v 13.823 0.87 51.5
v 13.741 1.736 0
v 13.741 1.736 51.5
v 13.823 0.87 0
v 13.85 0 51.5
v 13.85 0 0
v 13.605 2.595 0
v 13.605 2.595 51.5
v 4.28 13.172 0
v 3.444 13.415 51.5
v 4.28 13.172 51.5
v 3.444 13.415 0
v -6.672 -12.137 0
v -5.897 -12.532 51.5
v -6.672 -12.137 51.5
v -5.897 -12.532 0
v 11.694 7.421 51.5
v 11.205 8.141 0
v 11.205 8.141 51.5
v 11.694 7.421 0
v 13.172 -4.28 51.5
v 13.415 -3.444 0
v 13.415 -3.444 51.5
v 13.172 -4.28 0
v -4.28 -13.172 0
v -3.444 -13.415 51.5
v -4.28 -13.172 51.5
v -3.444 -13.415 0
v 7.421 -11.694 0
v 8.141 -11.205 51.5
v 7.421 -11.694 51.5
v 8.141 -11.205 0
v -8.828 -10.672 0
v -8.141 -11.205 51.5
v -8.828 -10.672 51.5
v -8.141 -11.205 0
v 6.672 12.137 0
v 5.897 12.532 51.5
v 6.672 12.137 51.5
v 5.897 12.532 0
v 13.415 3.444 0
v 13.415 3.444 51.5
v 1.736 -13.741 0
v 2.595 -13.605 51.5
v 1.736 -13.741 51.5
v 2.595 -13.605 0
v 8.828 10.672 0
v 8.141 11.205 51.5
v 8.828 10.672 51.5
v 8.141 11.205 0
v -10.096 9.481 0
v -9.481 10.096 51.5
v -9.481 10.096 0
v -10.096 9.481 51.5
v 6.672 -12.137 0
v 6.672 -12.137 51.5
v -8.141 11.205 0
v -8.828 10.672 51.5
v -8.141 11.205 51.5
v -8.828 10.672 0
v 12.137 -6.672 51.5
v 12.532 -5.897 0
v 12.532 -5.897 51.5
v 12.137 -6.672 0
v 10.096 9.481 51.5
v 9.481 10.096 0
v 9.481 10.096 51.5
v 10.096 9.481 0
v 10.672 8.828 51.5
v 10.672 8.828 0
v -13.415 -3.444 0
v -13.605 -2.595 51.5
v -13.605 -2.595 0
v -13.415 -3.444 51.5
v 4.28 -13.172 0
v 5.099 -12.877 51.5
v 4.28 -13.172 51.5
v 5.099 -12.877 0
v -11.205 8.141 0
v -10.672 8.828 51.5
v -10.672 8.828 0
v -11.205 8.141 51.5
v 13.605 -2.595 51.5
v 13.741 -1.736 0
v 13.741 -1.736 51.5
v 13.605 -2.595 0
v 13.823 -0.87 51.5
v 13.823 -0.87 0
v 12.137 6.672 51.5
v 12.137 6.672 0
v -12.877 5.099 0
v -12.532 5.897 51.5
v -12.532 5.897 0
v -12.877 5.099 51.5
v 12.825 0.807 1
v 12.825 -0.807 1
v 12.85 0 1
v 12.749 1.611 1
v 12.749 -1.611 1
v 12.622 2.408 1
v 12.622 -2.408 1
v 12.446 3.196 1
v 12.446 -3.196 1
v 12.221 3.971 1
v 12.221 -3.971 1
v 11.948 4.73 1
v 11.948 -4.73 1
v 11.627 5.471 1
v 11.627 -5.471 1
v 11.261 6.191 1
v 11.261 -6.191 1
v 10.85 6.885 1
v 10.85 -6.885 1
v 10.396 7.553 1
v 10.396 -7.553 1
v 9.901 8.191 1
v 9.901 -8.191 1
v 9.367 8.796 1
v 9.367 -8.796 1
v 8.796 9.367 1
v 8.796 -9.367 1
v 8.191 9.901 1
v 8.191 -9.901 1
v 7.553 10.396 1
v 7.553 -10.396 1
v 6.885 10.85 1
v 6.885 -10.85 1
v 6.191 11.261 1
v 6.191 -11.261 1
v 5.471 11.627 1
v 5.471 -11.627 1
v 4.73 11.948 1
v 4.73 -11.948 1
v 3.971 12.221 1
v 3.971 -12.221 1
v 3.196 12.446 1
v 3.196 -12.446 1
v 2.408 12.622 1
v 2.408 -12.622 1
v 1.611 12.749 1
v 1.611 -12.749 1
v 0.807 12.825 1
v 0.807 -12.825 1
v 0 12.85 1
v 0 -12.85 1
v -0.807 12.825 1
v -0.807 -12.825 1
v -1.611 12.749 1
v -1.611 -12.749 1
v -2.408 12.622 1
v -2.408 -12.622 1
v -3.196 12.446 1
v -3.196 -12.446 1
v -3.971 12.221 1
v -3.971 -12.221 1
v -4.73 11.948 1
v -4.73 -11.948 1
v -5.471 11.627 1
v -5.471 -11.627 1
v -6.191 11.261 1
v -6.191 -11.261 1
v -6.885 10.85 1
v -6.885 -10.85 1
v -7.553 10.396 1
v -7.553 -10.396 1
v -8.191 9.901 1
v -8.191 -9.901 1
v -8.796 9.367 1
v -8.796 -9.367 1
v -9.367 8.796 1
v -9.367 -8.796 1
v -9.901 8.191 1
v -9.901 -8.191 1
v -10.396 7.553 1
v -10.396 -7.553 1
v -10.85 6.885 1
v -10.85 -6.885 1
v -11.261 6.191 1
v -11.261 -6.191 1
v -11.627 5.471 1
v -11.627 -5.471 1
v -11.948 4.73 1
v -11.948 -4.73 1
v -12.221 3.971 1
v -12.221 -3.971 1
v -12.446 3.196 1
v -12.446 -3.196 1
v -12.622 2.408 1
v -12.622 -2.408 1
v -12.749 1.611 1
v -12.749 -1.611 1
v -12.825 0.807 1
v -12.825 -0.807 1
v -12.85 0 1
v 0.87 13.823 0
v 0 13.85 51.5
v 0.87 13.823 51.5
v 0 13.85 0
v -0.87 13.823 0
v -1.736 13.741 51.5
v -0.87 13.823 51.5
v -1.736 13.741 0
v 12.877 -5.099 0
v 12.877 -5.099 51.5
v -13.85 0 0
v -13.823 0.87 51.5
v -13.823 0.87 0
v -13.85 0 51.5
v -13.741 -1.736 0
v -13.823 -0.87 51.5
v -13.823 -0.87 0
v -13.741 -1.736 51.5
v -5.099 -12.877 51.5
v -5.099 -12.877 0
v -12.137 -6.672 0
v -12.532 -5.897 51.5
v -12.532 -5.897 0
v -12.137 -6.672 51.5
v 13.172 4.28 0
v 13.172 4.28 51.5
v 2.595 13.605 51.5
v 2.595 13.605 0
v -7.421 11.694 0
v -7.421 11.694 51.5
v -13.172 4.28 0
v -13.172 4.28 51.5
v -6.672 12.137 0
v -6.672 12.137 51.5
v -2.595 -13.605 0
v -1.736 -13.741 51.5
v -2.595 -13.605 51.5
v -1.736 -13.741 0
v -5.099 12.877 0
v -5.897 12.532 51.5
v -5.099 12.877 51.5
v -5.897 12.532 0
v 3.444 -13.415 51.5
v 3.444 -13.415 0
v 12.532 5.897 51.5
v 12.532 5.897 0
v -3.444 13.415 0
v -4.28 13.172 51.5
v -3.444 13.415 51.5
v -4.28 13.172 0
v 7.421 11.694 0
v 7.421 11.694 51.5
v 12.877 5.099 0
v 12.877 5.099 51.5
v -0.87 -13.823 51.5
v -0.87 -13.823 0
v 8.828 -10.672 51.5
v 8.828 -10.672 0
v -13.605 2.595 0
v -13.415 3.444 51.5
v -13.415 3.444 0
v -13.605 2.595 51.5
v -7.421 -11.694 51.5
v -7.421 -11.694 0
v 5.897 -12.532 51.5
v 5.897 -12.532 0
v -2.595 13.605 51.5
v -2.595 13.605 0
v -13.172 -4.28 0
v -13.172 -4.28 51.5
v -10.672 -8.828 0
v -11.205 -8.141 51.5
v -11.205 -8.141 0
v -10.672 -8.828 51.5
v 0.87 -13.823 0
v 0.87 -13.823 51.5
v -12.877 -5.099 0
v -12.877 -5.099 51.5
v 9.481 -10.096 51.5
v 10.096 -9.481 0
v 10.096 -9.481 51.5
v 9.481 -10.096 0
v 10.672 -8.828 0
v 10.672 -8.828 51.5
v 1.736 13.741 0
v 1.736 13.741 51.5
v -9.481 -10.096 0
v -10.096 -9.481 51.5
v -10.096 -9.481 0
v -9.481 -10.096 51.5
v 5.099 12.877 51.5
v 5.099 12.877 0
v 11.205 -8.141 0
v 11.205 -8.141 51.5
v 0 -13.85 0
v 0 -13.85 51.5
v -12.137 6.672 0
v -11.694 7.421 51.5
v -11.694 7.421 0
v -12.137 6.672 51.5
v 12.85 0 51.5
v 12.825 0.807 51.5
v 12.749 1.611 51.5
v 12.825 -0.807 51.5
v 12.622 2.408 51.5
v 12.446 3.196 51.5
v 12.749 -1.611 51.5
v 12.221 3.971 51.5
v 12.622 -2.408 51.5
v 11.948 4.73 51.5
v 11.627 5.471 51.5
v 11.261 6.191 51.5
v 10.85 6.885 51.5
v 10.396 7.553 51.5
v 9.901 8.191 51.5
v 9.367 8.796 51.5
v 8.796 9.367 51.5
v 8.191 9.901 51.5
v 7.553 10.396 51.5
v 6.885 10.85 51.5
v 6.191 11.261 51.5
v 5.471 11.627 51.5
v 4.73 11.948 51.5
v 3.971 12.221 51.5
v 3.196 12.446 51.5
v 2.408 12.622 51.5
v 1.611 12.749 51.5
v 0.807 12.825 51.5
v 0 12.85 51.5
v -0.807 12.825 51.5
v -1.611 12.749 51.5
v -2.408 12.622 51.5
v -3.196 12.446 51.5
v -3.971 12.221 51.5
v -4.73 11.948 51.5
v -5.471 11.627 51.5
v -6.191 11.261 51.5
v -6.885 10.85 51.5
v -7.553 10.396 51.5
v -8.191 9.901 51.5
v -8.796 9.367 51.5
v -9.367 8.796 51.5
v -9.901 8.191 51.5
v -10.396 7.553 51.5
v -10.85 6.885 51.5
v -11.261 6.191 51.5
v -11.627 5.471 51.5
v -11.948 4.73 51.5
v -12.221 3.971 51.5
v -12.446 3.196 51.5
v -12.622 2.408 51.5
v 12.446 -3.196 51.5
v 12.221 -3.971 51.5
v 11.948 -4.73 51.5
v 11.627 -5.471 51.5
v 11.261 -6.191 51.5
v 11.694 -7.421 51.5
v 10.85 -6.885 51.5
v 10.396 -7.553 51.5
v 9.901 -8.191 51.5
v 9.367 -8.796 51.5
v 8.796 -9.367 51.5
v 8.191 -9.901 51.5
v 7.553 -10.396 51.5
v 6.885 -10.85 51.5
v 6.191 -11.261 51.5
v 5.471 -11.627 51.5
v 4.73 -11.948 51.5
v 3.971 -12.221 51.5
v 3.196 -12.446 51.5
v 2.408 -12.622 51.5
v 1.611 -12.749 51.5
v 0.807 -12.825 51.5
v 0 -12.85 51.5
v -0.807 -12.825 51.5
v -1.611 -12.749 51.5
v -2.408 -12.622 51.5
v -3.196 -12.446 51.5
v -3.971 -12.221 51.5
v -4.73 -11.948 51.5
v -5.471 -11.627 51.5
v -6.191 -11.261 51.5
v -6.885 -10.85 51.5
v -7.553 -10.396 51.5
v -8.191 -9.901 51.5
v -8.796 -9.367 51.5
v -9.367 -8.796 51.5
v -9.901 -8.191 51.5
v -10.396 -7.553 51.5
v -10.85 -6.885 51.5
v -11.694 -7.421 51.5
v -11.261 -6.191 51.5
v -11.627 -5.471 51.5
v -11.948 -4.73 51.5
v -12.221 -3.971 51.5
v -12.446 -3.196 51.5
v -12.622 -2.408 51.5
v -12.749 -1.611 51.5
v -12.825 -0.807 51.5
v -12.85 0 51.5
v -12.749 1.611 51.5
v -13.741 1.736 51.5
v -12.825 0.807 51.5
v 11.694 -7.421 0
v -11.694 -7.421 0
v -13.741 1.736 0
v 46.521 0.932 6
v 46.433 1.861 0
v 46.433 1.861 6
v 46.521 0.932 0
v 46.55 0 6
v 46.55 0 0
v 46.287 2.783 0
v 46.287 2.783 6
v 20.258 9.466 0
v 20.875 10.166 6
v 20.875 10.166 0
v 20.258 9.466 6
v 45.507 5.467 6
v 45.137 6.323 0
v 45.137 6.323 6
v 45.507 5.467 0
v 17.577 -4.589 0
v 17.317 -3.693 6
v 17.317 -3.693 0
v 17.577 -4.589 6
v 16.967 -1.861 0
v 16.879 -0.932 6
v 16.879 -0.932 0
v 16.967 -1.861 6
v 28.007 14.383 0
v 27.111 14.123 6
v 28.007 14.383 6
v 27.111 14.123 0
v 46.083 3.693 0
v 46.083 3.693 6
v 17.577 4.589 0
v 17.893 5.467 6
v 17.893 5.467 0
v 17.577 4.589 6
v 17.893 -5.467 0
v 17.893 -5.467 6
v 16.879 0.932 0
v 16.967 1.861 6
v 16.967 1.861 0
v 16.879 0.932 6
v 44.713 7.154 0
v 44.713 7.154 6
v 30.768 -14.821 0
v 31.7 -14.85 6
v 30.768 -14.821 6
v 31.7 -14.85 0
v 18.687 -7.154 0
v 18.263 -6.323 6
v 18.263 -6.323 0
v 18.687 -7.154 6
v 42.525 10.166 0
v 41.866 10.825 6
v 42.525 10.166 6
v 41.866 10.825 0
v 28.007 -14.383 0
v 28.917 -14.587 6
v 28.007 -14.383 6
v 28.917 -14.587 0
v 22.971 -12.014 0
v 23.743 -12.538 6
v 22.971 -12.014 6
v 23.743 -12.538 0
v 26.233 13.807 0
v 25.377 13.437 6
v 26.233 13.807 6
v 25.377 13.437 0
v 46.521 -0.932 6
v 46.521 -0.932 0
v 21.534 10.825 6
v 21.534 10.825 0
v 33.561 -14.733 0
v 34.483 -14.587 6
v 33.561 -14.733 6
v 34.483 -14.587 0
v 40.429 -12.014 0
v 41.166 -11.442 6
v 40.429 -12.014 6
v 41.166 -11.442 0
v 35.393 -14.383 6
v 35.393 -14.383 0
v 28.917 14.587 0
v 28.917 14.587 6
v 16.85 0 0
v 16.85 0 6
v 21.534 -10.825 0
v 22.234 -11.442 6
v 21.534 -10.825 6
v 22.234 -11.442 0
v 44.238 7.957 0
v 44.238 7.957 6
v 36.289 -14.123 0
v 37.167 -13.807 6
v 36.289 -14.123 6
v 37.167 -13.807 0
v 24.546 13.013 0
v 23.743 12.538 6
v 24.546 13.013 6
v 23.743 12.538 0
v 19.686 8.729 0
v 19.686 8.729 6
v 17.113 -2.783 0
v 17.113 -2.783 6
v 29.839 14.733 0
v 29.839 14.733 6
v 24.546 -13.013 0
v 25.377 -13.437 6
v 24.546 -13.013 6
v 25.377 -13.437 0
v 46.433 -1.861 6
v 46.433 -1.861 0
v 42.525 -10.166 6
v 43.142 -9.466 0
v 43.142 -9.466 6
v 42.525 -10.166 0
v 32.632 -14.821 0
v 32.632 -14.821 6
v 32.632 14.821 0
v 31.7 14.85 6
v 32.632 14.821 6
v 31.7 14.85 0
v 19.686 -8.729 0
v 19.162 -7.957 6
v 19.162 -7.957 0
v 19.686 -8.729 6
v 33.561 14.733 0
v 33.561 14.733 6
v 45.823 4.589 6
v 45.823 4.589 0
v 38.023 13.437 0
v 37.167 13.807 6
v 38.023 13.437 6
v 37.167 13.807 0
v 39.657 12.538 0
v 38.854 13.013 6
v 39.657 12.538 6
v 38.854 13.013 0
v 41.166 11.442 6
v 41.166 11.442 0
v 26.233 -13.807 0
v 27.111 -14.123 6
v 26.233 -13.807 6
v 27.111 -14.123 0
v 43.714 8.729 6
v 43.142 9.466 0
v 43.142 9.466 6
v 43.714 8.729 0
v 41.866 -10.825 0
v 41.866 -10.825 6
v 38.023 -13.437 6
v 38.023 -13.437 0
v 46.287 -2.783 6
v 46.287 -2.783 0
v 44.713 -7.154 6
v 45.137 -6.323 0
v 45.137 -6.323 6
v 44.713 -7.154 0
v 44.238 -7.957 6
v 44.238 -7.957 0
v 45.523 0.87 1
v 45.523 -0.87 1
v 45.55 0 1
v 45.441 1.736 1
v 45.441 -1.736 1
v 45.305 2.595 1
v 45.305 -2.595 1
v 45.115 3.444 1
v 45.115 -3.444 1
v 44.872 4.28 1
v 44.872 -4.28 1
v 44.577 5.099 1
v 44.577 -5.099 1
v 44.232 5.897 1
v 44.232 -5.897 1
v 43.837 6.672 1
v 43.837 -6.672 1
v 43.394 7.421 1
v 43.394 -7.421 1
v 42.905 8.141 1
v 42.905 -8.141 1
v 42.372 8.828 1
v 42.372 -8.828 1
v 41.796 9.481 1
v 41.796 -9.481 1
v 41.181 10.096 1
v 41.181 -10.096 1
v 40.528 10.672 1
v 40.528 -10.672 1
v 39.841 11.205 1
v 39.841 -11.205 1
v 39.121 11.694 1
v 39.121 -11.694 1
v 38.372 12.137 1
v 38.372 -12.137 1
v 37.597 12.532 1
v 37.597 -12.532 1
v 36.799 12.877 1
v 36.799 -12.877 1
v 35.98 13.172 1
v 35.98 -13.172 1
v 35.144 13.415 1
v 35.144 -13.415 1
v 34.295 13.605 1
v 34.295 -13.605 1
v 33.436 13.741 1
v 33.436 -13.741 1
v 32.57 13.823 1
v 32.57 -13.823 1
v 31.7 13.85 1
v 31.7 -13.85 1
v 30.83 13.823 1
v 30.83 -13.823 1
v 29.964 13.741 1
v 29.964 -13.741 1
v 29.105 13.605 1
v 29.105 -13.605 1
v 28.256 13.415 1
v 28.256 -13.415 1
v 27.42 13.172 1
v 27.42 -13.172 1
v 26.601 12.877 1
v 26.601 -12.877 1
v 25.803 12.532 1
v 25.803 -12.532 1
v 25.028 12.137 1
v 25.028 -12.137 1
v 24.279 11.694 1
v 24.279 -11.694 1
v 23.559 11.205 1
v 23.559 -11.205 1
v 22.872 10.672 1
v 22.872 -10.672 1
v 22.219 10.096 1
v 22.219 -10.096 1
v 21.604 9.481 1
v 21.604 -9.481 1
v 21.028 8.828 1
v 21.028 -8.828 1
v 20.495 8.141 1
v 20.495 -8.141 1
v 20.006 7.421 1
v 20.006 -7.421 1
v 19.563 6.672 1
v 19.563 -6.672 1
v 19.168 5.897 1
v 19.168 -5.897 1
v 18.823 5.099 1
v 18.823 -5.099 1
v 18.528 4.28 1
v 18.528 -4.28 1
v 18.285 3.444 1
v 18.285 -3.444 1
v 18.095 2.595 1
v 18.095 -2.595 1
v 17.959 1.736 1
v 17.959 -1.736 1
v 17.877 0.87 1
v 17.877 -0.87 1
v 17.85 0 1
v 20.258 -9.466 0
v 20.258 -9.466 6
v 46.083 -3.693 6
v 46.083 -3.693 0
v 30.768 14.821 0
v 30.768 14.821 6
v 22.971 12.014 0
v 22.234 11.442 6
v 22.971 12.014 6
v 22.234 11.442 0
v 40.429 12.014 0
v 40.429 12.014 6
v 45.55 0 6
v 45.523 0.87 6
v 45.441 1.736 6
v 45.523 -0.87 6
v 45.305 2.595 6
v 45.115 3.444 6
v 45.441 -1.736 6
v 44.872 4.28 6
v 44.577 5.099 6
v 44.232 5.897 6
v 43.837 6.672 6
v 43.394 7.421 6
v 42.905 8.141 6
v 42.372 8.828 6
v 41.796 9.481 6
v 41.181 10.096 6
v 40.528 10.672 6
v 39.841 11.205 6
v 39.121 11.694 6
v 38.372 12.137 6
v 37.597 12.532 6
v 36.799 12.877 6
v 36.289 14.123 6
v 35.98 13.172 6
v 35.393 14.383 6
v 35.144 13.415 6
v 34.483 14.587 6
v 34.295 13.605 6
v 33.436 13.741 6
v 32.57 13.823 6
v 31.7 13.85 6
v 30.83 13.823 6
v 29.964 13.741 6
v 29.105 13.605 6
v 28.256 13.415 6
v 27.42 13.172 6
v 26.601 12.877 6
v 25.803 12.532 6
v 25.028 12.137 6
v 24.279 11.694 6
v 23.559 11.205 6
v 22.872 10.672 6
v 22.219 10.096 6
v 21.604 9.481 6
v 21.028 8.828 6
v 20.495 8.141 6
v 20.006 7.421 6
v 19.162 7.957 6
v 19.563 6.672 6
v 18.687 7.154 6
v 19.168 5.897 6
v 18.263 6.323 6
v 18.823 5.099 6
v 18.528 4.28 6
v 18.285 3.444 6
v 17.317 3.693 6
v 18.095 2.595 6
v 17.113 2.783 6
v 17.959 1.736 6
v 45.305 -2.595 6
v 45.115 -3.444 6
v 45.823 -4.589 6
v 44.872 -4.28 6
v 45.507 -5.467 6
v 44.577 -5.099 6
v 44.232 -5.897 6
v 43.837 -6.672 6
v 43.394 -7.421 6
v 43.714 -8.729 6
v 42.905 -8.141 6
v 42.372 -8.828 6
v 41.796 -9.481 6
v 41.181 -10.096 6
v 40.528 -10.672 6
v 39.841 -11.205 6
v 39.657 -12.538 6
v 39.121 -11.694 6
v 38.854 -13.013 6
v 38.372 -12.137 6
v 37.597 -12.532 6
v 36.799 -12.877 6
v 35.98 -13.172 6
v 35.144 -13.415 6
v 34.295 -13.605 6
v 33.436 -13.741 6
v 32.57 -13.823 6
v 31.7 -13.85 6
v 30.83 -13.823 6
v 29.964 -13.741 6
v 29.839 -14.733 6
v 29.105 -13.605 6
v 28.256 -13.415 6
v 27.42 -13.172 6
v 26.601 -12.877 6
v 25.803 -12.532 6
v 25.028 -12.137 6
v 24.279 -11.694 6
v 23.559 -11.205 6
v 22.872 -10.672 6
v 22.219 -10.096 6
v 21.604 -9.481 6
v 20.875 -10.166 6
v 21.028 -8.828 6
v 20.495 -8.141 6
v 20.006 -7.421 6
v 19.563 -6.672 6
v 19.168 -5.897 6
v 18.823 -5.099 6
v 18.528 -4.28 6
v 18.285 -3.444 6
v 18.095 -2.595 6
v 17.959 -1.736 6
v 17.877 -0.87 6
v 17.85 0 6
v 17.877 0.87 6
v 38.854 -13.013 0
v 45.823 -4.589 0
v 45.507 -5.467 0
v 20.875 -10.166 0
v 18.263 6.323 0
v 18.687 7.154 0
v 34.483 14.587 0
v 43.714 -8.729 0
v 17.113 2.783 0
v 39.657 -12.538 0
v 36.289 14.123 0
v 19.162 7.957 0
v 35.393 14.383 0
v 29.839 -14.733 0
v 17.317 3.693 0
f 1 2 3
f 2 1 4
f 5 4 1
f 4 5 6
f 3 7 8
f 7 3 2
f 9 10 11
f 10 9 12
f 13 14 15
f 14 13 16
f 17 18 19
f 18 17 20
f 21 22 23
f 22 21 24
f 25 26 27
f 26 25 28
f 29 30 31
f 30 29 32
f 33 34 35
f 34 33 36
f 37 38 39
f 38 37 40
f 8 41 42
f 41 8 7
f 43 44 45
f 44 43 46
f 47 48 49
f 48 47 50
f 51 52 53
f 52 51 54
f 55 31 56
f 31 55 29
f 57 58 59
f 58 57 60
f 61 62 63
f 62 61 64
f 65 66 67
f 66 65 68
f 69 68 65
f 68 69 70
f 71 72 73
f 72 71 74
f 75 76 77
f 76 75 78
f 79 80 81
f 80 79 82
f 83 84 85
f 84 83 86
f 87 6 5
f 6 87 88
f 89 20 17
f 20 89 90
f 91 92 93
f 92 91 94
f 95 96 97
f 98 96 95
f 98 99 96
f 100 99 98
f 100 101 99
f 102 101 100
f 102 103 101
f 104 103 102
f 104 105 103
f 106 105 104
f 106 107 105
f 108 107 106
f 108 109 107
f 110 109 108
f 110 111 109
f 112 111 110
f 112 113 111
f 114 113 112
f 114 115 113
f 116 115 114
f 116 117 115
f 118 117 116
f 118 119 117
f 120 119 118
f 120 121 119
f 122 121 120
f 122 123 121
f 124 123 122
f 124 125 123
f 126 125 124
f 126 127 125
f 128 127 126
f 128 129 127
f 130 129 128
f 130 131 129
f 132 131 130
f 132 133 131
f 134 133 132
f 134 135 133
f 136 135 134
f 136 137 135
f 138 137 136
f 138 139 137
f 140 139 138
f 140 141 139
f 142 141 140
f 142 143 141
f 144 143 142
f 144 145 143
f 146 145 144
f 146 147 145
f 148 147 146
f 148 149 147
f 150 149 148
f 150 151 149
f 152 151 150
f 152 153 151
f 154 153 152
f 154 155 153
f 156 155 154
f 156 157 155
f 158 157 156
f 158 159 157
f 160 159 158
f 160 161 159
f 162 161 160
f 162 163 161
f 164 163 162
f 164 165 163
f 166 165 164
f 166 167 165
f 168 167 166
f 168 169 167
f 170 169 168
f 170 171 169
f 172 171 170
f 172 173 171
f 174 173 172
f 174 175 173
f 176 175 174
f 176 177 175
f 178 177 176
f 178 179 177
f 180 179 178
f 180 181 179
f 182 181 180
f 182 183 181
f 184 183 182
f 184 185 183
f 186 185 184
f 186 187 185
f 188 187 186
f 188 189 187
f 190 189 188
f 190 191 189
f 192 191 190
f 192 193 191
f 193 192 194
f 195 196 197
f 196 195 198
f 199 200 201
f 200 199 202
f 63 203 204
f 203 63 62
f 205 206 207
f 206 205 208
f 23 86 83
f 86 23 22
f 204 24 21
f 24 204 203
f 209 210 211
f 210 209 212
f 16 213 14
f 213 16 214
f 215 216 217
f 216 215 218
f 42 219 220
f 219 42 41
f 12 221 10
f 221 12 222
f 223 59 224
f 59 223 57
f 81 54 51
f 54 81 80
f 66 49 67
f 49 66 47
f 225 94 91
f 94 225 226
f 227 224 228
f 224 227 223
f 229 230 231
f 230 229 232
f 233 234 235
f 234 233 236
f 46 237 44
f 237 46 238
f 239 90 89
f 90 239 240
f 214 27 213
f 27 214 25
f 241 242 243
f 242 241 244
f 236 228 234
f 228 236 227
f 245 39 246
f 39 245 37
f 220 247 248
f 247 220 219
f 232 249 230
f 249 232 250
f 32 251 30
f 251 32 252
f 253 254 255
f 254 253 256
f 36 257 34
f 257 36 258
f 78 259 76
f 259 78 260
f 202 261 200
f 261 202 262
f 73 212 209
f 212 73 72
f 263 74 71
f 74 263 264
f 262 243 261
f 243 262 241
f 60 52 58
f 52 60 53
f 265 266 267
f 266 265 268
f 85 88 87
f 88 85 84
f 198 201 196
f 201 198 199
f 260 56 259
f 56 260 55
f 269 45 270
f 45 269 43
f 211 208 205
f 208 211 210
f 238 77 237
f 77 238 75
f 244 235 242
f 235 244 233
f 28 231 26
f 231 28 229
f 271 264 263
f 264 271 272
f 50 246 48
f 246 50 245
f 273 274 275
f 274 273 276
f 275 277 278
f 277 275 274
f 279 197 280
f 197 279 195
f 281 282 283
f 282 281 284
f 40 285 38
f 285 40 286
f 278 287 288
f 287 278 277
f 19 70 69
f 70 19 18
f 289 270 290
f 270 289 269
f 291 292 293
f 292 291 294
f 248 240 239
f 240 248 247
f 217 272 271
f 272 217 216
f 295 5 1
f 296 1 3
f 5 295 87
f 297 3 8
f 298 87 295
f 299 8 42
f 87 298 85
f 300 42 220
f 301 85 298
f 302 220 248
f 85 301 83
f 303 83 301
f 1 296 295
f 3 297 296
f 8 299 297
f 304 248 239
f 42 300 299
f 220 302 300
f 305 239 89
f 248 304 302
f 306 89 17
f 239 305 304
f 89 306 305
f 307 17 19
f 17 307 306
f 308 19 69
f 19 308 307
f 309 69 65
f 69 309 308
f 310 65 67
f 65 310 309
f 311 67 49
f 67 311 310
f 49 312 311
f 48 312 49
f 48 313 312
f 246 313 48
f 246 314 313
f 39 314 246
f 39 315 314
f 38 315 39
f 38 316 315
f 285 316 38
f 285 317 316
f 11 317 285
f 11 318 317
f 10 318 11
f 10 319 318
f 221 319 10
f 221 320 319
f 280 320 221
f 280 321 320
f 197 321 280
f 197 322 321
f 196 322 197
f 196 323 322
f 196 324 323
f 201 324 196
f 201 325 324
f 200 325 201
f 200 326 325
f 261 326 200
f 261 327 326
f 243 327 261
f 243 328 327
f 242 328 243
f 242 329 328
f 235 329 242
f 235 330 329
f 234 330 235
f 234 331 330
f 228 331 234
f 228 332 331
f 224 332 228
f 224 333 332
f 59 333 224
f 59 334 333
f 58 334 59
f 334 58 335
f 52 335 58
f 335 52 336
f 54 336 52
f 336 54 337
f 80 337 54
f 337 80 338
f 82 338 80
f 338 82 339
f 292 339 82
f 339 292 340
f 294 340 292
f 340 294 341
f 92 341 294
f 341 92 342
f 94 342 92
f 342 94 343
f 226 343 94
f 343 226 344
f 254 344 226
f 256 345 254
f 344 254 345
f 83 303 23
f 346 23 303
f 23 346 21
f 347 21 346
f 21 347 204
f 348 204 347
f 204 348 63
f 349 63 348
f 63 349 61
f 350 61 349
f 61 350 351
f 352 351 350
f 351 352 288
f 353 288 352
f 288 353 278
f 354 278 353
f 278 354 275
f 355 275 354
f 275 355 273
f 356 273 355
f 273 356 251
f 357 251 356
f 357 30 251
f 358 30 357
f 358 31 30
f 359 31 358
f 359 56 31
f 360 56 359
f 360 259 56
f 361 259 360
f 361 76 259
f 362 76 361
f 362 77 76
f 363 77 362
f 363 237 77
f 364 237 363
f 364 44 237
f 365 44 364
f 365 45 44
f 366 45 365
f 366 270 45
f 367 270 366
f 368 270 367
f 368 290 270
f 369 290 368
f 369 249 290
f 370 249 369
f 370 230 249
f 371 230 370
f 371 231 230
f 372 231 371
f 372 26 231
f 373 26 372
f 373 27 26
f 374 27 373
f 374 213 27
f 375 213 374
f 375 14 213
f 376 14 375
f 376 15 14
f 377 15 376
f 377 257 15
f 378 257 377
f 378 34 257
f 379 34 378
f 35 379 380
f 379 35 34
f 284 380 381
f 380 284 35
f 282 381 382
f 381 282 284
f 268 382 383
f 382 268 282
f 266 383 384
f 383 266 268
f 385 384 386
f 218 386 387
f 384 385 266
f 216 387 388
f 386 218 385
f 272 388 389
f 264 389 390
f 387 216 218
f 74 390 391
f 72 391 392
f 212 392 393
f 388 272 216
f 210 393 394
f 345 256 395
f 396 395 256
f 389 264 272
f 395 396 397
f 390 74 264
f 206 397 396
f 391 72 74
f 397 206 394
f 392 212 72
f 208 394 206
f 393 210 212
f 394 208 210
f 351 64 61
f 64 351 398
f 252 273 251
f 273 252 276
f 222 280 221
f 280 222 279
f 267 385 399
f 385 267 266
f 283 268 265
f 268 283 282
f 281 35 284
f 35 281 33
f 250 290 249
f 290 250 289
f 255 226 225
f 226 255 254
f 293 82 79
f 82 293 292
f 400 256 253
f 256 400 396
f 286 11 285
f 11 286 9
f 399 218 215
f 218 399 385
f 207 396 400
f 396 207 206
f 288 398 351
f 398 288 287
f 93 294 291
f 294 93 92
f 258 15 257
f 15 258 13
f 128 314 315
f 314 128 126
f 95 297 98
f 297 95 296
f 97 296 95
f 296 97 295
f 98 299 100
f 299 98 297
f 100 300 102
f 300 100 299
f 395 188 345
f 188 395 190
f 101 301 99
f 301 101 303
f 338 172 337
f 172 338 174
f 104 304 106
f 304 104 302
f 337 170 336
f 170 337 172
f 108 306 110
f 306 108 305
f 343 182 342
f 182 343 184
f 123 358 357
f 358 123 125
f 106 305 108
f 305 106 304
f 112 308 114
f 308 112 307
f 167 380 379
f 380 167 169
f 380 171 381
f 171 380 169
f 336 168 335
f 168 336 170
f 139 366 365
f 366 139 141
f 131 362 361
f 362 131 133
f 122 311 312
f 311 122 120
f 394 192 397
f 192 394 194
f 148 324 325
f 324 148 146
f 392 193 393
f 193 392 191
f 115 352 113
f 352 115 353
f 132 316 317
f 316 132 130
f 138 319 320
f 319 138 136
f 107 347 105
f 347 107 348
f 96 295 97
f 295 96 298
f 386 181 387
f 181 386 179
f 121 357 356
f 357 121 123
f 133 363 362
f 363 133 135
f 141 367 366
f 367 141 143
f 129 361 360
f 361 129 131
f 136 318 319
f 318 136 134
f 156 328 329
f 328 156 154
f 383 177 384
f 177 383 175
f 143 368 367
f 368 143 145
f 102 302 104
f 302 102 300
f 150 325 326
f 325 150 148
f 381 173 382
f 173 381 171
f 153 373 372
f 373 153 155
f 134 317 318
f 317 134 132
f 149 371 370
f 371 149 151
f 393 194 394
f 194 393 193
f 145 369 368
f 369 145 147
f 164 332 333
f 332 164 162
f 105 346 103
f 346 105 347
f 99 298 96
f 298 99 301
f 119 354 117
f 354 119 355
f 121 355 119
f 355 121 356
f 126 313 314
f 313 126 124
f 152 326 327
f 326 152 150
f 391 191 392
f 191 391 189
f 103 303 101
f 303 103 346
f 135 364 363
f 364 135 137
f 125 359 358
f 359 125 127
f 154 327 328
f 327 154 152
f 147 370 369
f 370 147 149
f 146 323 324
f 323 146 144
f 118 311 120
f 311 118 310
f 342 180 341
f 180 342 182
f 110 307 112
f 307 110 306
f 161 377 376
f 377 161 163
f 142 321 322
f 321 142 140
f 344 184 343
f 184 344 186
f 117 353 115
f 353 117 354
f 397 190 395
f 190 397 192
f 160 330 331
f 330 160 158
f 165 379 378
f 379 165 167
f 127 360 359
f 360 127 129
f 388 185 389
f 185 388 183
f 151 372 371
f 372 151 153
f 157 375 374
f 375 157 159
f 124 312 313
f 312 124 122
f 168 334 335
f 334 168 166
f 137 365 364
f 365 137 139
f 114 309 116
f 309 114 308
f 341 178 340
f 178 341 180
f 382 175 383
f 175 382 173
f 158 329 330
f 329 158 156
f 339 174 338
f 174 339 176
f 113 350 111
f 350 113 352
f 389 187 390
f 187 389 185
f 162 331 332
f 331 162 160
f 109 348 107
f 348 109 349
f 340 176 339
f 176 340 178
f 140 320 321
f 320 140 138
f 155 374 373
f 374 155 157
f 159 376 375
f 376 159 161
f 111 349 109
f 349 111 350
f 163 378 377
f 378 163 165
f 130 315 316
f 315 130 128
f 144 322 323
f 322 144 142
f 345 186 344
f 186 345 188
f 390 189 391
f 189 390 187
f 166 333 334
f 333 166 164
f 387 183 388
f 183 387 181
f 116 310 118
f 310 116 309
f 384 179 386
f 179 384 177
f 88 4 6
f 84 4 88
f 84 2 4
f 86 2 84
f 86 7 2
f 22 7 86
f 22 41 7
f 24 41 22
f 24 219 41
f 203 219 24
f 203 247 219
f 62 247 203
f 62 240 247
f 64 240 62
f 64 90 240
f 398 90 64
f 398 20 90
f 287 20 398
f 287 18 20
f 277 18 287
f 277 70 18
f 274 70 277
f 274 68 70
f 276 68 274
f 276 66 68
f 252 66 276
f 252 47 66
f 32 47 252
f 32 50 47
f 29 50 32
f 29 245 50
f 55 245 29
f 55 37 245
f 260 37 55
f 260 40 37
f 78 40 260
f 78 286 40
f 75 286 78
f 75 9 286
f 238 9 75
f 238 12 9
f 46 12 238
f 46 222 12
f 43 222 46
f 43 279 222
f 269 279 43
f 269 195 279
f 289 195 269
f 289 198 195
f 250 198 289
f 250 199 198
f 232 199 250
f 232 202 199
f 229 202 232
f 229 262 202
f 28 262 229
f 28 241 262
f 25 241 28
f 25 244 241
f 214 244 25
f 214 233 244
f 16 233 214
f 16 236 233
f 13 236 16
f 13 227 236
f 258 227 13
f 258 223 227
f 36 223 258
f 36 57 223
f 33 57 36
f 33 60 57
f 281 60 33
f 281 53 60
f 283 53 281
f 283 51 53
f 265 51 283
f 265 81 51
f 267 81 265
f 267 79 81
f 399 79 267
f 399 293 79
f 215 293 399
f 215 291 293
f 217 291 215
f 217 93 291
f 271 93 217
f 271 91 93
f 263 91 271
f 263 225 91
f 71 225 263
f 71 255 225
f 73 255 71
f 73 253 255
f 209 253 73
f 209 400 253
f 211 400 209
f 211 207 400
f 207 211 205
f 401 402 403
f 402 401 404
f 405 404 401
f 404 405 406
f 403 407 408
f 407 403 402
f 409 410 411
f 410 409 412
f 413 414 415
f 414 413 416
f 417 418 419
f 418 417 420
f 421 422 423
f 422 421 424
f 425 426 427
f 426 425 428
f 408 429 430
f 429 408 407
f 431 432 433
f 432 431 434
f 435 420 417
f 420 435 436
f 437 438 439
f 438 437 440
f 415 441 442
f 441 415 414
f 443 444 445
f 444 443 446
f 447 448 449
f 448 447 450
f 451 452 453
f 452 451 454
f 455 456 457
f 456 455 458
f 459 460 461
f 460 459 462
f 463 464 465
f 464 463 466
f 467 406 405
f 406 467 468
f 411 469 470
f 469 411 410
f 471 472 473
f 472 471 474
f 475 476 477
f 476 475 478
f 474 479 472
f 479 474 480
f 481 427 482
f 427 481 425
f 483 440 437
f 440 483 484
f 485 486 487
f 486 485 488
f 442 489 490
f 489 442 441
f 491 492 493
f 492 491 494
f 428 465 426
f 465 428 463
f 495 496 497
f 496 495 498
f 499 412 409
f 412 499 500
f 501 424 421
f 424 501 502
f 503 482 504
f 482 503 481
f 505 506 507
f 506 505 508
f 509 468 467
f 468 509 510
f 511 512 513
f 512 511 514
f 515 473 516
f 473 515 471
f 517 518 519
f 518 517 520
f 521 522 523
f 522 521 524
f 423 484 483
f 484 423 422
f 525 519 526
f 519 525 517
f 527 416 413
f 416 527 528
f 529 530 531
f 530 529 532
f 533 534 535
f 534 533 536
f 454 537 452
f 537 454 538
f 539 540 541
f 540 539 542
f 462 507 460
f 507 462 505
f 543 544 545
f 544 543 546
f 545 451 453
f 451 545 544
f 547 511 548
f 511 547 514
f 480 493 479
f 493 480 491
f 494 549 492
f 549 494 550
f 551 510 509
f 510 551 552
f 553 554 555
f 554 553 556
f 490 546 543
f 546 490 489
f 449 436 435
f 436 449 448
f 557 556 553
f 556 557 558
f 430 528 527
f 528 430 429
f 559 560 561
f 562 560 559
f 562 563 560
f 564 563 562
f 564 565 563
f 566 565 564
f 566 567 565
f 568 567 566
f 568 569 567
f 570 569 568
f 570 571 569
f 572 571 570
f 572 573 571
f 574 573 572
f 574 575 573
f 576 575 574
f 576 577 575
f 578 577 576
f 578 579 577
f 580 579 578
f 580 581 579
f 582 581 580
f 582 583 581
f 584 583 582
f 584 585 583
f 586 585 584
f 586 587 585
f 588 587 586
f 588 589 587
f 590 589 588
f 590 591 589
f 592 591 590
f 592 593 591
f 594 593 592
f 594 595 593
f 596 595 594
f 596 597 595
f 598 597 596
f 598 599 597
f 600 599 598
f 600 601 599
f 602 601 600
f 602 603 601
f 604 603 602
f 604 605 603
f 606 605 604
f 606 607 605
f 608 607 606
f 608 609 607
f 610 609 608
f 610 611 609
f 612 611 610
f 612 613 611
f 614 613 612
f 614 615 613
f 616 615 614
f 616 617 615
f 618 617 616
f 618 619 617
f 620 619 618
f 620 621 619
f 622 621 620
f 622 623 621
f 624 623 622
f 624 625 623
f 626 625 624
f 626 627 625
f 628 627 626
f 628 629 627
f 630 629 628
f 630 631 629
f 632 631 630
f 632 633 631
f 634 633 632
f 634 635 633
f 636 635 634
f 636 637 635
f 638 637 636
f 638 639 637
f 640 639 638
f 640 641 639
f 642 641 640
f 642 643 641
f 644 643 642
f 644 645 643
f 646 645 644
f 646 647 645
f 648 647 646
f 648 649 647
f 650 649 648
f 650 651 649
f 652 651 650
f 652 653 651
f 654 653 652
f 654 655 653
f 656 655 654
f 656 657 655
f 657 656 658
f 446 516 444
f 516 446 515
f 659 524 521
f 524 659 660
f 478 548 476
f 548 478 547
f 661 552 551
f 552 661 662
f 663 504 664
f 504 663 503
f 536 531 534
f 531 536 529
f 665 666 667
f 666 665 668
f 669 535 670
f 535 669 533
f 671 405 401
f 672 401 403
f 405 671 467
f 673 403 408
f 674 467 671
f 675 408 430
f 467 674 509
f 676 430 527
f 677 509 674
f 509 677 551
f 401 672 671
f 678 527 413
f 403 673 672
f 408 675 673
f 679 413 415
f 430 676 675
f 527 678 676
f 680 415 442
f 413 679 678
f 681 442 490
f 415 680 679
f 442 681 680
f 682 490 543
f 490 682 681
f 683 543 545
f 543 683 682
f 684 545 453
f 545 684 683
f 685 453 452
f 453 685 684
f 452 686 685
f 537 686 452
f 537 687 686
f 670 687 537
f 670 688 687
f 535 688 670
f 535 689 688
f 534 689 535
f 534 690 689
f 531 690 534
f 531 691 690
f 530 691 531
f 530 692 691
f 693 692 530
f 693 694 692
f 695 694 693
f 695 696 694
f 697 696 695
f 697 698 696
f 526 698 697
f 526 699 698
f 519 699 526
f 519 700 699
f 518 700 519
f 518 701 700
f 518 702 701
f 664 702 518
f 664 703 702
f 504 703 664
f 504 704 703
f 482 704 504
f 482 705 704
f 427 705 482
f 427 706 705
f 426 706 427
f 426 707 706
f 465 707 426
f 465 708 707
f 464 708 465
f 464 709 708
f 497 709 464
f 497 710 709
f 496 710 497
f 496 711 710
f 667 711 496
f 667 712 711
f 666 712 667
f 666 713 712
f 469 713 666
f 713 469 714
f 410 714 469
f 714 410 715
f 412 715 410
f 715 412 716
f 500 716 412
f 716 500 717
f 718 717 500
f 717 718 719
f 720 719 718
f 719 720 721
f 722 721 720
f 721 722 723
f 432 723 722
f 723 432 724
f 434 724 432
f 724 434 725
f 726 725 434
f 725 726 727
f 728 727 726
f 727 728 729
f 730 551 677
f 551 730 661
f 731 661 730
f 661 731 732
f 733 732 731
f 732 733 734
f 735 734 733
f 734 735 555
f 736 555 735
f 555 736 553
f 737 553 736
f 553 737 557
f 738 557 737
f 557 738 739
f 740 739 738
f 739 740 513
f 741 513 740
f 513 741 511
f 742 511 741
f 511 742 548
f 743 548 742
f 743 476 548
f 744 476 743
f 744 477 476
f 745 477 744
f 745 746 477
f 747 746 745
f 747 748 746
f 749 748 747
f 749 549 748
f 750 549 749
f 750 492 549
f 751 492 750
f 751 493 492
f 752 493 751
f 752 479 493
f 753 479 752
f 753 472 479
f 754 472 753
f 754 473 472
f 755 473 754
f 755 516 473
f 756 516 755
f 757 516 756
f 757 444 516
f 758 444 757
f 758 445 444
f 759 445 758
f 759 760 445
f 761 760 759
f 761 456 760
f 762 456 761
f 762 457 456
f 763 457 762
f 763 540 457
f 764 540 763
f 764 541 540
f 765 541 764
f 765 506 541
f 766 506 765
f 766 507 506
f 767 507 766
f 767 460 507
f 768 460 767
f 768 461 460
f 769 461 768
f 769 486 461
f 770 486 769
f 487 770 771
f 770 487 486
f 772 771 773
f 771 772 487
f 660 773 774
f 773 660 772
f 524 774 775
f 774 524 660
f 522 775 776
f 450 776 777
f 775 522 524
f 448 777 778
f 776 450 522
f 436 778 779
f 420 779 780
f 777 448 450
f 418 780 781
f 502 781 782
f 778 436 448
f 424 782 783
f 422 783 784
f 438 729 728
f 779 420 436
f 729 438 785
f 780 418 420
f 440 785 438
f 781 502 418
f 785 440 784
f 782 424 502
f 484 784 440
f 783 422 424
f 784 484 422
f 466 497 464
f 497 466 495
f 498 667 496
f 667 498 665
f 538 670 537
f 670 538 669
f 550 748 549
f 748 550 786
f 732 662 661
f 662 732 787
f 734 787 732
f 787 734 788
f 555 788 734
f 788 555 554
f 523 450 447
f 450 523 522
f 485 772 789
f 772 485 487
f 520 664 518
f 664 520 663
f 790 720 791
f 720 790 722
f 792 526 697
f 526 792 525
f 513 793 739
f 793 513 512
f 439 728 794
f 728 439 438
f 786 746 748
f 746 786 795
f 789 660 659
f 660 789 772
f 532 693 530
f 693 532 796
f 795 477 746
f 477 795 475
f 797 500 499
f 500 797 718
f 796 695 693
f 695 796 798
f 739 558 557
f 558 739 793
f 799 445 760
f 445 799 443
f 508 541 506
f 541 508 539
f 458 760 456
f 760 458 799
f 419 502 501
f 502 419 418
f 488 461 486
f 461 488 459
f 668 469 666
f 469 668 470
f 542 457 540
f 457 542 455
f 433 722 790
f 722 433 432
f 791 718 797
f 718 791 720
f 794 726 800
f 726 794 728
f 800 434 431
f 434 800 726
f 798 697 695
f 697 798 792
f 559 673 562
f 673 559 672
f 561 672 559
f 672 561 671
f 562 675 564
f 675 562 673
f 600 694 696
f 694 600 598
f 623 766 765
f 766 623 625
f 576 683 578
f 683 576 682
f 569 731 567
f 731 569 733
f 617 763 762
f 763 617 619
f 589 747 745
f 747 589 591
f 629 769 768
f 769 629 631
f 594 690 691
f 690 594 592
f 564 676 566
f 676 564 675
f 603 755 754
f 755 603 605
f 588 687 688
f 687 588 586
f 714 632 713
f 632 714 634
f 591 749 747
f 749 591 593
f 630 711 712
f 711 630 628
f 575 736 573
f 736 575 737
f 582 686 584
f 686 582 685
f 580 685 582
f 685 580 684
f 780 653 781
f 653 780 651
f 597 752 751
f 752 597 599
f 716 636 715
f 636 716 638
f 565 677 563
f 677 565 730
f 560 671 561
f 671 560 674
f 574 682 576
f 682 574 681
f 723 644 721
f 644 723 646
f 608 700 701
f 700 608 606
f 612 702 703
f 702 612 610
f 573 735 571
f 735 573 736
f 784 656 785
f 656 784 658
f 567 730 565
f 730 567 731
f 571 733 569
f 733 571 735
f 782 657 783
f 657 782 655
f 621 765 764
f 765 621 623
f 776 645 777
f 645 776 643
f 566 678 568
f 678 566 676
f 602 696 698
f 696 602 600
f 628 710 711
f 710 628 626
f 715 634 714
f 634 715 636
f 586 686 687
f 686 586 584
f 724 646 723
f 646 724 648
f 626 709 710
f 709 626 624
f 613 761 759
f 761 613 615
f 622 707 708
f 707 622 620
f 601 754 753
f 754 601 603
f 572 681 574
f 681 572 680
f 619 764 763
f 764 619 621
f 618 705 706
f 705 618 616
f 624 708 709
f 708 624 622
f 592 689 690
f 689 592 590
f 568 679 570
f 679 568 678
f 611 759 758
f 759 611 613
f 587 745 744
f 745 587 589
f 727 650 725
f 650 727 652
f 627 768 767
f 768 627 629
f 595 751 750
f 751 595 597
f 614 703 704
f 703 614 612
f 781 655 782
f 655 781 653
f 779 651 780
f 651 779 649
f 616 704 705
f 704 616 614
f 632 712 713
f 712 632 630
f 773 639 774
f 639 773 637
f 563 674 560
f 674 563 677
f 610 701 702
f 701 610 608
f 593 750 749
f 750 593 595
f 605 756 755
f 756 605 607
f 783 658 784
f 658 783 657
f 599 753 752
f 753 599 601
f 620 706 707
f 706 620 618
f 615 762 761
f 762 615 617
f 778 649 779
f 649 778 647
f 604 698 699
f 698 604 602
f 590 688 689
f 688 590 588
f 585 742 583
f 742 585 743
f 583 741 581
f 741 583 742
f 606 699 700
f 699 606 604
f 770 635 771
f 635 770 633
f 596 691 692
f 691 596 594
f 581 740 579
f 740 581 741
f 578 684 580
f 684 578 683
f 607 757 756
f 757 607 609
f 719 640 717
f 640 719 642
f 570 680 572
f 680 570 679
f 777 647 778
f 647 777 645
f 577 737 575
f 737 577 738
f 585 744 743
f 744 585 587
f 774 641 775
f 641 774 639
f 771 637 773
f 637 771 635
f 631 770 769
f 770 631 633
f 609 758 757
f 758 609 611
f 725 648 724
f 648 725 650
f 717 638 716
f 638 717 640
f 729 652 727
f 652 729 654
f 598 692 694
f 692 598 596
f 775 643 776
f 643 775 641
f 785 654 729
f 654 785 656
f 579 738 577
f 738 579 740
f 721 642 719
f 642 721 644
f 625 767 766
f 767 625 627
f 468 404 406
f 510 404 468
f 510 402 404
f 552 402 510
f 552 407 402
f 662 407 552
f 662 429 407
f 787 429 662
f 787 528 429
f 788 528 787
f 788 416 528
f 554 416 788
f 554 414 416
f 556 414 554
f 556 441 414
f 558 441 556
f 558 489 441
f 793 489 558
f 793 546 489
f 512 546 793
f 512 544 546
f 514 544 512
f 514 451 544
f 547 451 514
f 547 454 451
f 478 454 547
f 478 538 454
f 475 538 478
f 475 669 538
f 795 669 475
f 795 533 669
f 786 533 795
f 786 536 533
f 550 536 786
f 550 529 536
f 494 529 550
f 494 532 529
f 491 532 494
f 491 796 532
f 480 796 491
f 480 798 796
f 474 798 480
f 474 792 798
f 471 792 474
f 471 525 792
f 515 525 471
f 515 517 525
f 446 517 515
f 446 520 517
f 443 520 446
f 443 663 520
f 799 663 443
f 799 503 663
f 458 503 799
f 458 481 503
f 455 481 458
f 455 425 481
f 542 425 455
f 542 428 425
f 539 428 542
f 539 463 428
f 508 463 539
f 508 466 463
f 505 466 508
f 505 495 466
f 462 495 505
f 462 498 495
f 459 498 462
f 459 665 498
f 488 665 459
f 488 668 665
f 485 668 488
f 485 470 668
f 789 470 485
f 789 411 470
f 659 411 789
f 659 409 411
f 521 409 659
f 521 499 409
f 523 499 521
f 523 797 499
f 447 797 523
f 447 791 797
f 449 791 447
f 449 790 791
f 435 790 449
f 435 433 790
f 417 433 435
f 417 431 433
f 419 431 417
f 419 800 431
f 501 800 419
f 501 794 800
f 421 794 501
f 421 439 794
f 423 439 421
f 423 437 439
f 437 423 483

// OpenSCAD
/*  
**  Name:  Customizable American Coin Container_3d_model
**  Author:  Chris Benson  @TheExtruder
**  Created:  2/24/2017
*/
coin = "Dollar" ; // [Pennies,Nickels,Dimes,Quarters,Dollar,Silver Eagles]

numberOfCoins = 25;

/* [Hidden] */
$fn = 100;
capHeight = 5;
wallThickness = 1;

print_part();

module print_part() {
	if (coin == "Pennies") {
        CreateContainerAndCap(
            numberOfCoins = numberOfCoins,
            coinHeight = 1.54,
            coinDiameter = 19.07,
            wallThickness = wallThickness,
            capHeight = capHeight
        );
	} else if (coin == "Nickels") {
        CreateContainerAndCap(
            numberOfCoins = numberOfCoins,
            coinHeight = 1.97,
            coinDiameter = 21.23,
            wallThickness = wallThickness,
            capHeight = capHeight
        );
	} else if (coin == "Dimes") {
		CreateContainerAndCap(
            numberOfCoins = numberOfCoins,
            coinHeight = 1.37,
            coinDiameter = 17.93,
            wallThickness = wallThickness,
            capHeight = capHeight
        );
    } else if (coin == "Quarters") {
		CreateContainerAndCap(
            numberOfCoins = numberOfCoins,
            coinHeight = 1.77,
            coinDiameter = 24.28,
            wallThickness = wallThickness,
            capHeight = capHeight
        );
    } else if (coin == "Dollar") {
		CreateContainerAndCap(
            numberOfCoins = numberOfCoins,
            coinHeight = 2.02,
            coinDiameter = 25.7,
            wallThickness = wallThickness,
            capHeight = capHeight
        );
    } else if (coin == "Silver Eagles") {
		CreateContainerAndCap(
            numberOfCoins = numberOfCoins,
            coinHeight = 3,
            coinDiameter = 41,
            wallThickness = wallThickness,
            capHeight = capHeight
        );
	}
}

module CreateContainerAndCap(numberOfCoins, coinHeight, coinDiameter, wallThickness, capHeight){
    CreateCylinder(numberOfCoins * coinHeight, coinDiameter, wallThickness);
    translate([coinDiameter + wallThickness + 5,0,0])
        CreateCylinder(capHeight, coinDiameter + wallThickness * 2, wallThickness);
}

module CreateCylinder(height,innerDiameter,wallThinkness){
    union(){
        //bottom
        cylinder(wallThickness, d=innerDiameter + (wallThickness * 2), true);
        
        translate([0,0,wallThickness]){
            difference(){
                //outer wall
                cylinder(height, d=innerDiameter + (wallThickness * 2), true);
                //inner wall
                cylinder(height, d=innerDiameter, true);
            }
        }
    }
}
